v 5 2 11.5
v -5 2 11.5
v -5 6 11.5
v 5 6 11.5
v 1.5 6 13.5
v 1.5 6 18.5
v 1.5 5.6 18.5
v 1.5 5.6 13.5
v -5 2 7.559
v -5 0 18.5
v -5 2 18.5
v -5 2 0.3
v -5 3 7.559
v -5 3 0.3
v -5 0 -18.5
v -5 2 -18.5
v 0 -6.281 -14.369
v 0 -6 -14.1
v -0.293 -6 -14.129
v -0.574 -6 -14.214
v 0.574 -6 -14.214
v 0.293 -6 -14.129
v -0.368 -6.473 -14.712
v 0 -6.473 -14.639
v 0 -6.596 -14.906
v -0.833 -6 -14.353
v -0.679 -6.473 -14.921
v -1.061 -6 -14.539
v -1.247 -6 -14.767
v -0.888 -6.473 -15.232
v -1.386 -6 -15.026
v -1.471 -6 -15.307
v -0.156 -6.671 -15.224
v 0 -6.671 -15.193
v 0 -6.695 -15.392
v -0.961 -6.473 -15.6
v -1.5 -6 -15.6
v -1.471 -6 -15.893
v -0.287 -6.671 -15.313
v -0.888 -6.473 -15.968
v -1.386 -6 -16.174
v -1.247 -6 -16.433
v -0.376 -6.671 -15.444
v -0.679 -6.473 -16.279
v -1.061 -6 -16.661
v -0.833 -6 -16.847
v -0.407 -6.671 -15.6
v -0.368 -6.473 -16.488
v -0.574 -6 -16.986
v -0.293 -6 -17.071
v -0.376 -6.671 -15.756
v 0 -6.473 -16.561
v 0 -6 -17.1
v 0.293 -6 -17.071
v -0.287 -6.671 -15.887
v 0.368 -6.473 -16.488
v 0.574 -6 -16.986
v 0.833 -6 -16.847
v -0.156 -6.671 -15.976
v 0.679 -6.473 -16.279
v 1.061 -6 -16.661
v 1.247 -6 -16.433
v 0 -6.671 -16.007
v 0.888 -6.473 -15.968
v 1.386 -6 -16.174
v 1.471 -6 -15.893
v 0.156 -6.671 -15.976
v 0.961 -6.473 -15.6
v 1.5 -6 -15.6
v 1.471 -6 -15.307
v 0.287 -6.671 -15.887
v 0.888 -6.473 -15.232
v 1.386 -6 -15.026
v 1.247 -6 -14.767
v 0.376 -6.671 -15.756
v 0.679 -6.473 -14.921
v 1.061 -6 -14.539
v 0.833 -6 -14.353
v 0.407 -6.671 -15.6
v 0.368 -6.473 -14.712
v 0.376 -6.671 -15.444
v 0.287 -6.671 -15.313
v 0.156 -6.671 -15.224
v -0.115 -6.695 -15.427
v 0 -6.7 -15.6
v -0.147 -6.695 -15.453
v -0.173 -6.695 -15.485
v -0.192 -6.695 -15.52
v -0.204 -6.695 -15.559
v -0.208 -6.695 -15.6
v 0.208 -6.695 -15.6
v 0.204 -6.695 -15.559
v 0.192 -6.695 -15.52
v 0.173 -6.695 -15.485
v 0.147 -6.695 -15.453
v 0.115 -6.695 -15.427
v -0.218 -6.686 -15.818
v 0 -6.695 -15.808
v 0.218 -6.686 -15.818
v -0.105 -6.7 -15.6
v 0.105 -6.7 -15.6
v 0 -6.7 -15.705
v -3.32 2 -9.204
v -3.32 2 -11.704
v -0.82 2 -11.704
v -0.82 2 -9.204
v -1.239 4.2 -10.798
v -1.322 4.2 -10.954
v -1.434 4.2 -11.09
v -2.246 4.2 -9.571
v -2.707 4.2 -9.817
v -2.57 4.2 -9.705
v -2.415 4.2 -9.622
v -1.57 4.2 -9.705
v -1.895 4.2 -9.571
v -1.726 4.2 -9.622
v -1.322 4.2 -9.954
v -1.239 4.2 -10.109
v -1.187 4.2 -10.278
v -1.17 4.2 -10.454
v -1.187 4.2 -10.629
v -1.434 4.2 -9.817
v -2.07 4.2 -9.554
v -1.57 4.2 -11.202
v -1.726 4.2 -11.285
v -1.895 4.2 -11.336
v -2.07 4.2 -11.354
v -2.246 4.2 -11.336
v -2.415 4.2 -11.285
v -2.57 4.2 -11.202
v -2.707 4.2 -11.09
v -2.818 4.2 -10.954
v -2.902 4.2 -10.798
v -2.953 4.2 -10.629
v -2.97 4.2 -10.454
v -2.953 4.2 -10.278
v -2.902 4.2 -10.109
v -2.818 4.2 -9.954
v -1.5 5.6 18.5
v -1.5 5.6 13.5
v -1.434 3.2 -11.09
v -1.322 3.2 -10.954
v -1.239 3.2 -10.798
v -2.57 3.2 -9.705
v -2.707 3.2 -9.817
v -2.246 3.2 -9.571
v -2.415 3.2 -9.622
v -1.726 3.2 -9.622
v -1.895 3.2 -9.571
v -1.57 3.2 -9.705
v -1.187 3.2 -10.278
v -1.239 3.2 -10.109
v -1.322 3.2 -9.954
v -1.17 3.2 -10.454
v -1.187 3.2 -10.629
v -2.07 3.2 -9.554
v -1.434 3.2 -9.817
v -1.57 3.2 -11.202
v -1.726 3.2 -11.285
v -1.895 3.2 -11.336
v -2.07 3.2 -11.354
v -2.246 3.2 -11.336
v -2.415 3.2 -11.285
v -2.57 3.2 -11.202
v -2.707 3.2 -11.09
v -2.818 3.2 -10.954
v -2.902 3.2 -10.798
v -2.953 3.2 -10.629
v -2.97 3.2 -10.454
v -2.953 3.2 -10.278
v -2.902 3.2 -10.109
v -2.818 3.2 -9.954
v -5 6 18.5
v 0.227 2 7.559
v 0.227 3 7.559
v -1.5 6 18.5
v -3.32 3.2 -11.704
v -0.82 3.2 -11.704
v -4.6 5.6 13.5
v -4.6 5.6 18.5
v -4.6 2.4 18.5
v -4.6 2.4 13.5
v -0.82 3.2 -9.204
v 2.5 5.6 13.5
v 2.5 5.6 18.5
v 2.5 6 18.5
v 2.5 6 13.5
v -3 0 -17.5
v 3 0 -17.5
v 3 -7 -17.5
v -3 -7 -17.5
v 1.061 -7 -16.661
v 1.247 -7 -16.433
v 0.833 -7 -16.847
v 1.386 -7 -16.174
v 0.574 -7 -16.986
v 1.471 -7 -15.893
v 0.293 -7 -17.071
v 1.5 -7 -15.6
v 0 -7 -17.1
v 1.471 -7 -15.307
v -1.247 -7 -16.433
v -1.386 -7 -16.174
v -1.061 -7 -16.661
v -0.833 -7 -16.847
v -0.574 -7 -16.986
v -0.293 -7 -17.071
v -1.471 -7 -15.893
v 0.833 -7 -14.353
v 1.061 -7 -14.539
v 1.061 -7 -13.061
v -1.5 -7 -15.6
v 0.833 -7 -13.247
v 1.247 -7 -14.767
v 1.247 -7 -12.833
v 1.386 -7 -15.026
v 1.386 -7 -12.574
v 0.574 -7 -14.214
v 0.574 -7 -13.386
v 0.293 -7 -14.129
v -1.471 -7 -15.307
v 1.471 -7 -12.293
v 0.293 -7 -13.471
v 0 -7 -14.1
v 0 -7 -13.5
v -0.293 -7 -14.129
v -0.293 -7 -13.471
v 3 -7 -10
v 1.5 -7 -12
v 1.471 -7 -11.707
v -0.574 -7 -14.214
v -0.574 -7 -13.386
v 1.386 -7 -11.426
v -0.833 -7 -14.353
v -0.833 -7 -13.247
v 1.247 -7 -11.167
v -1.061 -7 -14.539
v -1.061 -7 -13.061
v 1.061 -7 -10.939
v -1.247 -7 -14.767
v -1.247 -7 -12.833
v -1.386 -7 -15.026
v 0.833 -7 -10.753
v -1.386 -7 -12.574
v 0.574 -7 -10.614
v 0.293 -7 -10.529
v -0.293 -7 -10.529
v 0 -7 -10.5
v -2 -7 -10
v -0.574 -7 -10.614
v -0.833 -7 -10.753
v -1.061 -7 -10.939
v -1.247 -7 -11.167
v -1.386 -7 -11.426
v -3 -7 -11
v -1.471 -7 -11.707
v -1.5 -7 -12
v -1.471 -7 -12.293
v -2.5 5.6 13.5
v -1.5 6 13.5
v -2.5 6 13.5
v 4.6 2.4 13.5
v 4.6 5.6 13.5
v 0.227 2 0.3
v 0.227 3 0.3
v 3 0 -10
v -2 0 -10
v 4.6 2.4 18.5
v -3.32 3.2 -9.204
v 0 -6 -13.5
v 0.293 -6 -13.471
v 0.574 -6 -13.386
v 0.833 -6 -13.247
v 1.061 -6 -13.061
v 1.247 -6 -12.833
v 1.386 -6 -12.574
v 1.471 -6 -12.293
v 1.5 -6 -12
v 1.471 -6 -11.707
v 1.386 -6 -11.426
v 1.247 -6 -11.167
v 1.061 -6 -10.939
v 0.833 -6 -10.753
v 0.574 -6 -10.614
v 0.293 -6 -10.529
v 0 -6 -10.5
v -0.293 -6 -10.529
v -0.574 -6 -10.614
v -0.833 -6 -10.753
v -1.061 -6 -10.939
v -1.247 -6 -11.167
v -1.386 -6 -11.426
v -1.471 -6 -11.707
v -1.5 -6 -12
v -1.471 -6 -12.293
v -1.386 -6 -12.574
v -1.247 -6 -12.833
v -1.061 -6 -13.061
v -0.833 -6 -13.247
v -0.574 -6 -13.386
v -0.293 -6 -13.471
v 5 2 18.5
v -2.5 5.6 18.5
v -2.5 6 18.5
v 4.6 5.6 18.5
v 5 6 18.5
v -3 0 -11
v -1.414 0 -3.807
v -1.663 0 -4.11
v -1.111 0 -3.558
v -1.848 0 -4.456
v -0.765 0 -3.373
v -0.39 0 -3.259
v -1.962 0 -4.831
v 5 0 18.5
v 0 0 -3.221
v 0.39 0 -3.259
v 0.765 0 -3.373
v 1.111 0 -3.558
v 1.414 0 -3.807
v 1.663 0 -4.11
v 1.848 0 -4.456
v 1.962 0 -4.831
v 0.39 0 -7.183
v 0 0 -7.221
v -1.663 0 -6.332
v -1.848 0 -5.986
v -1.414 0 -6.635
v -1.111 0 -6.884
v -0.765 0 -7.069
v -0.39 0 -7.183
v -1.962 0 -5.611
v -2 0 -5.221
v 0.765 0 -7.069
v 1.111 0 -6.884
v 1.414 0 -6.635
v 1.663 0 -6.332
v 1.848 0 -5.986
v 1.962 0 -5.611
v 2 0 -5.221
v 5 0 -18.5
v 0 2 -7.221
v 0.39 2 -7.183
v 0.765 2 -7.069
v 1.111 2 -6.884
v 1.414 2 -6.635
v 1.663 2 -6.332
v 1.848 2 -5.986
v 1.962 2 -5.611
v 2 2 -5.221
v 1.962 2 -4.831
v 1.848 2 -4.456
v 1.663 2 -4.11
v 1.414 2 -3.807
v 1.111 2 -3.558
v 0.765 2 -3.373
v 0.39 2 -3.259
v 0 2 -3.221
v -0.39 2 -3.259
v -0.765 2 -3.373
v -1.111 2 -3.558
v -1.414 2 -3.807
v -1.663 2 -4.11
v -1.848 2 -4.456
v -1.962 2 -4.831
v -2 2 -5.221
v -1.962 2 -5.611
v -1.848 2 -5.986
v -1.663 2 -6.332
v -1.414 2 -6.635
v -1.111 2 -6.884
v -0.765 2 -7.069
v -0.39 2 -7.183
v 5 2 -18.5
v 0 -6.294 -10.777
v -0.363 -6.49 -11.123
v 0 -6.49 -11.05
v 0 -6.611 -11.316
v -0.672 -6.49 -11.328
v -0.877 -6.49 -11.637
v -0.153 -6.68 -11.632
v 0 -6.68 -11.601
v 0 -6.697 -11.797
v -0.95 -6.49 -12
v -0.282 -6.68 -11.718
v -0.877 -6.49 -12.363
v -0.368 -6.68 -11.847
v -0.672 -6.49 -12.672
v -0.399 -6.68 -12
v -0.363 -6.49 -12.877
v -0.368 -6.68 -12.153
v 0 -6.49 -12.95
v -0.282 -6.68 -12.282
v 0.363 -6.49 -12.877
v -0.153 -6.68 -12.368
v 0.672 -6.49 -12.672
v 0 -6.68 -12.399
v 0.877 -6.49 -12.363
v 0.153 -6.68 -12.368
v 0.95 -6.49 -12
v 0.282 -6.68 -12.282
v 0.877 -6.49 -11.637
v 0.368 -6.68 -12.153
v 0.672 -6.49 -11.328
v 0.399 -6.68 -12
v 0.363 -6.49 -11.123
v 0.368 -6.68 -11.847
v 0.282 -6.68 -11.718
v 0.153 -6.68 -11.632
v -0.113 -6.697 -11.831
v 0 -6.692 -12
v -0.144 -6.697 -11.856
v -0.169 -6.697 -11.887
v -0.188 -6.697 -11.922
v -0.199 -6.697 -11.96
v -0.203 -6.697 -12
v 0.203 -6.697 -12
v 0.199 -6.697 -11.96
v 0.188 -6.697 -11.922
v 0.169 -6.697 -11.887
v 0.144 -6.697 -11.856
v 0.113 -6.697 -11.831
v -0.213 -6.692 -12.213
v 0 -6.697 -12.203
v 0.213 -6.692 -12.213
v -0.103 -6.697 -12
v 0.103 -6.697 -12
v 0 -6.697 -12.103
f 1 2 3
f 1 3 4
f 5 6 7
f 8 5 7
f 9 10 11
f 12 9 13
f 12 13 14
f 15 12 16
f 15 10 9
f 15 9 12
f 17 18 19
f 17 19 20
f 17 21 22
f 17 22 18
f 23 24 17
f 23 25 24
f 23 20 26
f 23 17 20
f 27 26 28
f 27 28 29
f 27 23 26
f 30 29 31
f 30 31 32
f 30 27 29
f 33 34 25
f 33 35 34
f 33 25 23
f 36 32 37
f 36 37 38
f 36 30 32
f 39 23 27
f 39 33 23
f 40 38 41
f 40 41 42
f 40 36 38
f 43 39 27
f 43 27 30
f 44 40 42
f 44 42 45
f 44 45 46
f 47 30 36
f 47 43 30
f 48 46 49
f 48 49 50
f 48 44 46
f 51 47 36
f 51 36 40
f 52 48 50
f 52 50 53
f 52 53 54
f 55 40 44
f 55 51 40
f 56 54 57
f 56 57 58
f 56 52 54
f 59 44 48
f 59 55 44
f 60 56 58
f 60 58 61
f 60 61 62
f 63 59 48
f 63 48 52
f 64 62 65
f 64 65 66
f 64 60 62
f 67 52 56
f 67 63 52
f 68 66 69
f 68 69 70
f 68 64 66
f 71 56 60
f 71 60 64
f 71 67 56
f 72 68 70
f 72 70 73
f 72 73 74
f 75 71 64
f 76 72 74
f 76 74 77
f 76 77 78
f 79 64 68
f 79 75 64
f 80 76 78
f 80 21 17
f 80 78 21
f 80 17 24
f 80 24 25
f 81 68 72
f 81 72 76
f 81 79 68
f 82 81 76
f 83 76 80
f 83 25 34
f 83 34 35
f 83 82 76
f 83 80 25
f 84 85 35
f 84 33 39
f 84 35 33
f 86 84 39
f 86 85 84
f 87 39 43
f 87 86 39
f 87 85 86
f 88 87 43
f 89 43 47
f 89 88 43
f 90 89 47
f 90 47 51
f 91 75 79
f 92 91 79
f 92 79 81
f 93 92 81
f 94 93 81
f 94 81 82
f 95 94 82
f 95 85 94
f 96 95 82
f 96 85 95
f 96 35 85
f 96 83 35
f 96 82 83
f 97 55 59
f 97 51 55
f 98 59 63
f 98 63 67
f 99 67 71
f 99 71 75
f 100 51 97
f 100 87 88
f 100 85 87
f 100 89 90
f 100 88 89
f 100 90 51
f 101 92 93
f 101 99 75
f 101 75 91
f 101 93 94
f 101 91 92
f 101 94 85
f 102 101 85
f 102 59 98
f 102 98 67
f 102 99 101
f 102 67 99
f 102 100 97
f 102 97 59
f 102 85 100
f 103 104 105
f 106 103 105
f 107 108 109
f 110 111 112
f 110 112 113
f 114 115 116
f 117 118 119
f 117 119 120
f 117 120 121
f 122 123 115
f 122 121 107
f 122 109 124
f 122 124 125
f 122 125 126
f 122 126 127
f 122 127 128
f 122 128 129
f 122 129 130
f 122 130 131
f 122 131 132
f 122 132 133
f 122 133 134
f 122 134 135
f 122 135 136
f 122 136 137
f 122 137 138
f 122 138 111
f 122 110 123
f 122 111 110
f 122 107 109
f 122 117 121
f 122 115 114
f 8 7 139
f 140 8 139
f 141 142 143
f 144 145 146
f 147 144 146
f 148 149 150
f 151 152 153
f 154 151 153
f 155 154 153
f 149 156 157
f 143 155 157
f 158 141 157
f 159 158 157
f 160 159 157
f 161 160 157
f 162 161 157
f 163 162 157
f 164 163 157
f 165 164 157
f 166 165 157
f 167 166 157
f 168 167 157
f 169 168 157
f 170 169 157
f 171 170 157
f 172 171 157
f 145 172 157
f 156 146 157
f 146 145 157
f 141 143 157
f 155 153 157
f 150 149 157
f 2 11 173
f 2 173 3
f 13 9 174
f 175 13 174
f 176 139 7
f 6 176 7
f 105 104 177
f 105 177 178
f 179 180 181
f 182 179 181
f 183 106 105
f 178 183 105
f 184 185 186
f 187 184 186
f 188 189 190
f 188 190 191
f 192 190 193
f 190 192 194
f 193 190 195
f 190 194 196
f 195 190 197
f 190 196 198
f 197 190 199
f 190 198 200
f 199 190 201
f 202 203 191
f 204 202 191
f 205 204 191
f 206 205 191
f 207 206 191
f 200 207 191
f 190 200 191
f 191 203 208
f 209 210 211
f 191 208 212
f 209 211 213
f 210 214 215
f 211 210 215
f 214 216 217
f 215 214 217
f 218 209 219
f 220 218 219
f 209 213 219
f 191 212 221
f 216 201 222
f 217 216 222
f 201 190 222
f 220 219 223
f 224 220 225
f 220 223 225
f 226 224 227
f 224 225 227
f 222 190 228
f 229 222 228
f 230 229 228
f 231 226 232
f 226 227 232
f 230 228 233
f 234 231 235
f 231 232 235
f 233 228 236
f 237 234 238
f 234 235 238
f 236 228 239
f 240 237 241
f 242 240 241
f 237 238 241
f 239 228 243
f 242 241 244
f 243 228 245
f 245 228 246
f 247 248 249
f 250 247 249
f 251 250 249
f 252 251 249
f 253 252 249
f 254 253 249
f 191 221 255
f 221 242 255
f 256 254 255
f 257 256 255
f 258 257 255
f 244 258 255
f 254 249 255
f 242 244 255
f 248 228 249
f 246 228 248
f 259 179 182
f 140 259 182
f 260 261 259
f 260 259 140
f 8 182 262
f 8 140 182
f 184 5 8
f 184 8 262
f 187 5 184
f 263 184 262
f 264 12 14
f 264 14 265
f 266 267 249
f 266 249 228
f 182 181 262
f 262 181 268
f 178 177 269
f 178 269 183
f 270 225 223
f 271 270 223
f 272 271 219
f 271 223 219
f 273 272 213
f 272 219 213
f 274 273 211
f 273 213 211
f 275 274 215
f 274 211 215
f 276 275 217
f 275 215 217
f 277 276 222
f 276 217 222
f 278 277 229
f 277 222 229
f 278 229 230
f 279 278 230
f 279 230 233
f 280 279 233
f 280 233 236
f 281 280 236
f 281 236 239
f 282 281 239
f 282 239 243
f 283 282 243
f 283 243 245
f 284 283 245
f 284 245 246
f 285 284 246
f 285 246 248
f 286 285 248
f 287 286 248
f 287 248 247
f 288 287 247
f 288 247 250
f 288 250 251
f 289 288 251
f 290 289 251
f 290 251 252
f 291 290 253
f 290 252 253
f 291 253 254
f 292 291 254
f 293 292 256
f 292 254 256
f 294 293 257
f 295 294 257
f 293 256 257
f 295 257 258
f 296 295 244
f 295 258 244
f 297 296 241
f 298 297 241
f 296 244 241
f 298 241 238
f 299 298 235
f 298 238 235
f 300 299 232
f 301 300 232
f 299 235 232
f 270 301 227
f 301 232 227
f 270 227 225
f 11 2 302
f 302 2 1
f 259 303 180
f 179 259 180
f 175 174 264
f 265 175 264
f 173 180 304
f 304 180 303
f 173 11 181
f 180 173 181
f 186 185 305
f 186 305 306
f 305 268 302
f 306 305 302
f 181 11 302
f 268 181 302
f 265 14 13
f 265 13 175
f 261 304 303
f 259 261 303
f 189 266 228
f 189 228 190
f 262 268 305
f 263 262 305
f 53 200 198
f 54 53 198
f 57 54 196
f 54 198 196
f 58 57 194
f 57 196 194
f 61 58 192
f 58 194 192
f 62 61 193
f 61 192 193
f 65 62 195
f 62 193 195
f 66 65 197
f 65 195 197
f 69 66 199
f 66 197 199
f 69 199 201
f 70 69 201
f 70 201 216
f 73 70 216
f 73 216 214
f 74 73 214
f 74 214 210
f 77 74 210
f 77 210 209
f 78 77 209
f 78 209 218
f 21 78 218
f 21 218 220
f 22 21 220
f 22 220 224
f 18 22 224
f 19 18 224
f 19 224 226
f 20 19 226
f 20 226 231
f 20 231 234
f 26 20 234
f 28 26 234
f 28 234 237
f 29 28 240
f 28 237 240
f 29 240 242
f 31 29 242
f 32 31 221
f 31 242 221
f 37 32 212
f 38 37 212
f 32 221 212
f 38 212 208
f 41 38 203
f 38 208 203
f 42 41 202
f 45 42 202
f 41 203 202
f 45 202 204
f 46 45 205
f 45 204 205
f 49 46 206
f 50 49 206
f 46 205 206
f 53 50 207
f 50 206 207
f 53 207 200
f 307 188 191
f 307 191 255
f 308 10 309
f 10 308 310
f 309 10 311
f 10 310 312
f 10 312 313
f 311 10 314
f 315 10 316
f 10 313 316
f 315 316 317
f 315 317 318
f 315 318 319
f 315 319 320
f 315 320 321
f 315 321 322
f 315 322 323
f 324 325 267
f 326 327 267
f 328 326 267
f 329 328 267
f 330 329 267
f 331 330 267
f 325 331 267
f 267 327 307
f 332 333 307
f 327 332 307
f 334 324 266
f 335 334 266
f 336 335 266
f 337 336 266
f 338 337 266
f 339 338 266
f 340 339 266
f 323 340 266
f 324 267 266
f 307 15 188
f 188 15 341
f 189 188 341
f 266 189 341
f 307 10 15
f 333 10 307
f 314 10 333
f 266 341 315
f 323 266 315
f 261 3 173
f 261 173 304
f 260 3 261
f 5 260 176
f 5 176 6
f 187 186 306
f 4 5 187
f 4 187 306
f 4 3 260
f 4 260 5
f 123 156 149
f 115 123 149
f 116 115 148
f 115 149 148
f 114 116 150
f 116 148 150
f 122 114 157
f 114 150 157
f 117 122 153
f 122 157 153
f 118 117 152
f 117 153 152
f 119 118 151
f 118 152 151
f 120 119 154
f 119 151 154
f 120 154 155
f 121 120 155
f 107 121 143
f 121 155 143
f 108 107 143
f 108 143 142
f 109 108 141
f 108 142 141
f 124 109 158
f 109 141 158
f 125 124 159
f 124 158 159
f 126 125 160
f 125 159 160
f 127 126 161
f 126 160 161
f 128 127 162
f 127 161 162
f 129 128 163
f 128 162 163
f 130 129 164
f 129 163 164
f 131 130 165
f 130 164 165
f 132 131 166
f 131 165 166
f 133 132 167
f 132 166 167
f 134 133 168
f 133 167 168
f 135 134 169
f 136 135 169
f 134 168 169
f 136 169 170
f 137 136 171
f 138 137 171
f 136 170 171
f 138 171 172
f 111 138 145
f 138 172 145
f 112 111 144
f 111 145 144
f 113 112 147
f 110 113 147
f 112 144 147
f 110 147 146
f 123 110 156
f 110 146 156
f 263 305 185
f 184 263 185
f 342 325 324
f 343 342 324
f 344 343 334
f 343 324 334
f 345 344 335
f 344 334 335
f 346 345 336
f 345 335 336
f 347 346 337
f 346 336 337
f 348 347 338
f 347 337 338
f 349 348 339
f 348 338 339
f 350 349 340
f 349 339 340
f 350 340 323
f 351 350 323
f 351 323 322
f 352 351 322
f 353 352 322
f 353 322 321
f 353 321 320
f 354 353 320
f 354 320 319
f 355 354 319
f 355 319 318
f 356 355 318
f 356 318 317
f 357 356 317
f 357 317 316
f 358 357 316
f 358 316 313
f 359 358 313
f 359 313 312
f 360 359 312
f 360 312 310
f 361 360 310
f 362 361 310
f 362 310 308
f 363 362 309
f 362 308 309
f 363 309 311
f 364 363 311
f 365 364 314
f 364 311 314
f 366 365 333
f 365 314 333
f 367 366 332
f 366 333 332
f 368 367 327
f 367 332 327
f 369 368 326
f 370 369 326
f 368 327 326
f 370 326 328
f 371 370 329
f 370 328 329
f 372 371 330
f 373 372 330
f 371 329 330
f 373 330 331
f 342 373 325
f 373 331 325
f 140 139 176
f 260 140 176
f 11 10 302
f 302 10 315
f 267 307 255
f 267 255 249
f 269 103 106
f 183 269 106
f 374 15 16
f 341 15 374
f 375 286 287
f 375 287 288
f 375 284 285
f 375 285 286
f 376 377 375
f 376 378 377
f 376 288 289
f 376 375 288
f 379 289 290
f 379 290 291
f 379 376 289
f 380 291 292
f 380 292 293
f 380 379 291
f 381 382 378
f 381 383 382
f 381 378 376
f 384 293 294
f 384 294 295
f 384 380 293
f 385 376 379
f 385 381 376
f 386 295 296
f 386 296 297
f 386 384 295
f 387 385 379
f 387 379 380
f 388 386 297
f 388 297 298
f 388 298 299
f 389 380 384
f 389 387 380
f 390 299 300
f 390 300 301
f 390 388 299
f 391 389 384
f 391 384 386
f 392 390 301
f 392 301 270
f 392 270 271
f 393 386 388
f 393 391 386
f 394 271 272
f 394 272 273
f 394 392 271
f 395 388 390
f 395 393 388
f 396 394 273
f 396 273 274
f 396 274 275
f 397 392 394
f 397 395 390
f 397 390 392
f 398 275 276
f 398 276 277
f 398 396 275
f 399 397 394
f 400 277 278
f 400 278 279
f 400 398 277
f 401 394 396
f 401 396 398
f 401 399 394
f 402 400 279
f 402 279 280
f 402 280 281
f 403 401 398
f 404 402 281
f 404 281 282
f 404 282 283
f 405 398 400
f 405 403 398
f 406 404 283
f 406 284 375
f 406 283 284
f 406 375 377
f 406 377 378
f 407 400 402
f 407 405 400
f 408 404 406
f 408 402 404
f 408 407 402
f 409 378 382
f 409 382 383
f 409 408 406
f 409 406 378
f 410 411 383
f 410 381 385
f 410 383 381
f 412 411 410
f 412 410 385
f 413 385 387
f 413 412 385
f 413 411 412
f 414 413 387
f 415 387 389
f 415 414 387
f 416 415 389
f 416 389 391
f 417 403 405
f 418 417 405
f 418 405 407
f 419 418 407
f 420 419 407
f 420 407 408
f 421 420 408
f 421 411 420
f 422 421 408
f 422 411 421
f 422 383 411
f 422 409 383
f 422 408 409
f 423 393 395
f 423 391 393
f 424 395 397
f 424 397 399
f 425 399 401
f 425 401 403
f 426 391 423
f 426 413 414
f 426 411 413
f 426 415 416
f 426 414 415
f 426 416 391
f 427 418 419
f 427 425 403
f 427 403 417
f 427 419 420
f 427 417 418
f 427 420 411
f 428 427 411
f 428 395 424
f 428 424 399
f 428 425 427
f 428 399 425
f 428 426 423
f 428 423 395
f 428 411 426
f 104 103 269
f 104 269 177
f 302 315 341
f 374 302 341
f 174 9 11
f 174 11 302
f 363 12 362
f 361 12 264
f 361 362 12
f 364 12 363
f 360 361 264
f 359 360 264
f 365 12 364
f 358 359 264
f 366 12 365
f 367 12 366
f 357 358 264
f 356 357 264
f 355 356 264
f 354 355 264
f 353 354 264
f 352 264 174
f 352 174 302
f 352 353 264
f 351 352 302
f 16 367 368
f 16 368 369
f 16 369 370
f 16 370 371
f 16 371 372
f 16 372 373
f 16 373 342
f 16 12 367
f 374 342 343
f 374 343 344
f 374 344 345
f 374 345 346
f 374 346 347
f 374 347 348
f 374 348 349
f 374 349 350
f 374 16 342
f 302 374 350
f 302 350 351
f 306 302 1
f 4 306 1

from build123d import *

# Parameters (mm, degrees)
SKETCH_1_W          = 10
SKETCH_1_H          = 37
EXTRUDE_1_DEPTH     = 2
SKETCH_2_W          = 10
SKETCH_2_H          = 7
EXTRUDE_2_DEPTH     = 4
CUT_EXTRUDE_1_DEPTH = 5
SKETCH_4_R          = 2
CUT_EXTRUDE_2_DEPTH = 5
EXTRUDE_3_DEPTH     = 7
SKETCH_6_W          = 5.227328637
SKETCH_6_H          = 7.258677384
EXTRUDE_4_DEPTH     = 1
SKETCH_7_W          = 2.5
SKETCH_7_H          = 2.5
EXTRUDE_5_DEPTH     = 1.2
SKETCH_8_R          = 0.9
EXTRUDE_6_DEPTH     = 1
SKETCH_9_R          = 1.5
CUT_EXTRUDE_3_DEPTH = 1


with BuildPart() as part:
    # 草图1 → 凸台-拉伸1 (new body)
    with BuildSketch(Plane(origin=(0, 0, 0), x_dir=(1, 0, 0), z_dir=(0, 1, 0))):
        Rectangle(SKETCH_1_W, SKETCH_1_H)
    extrude(amount=EXTRUDE_1_DEPTH)

    # 草图4 → 切除-拉伸2 (cut)
    with BuildSketch(Plane.XZ):
        with Locations((0, -5.22098653)):
            Circle(SKETCH_4_R)
    extrude(amount=-CUT_EXTRUDE_2_DEPTH, mode=Mode.SUBTRACT)

    # 草图5 → 凸台-拉伸3 (add)
    with BuildSketch(Plane.XZ):
        Polygon((-2, -10), (3, -10), (3, -17.5), (-3, -17.5), (-3, -11), align=None)
    extrude(amount=EXTRUDE_3_DEPTH)

    # 草图6 → 凸台-拉伸4 (add)
    with BuildSketch(Plane(origin=(0, 2, 0), x_dir=(1, 0, 0), z_dir=(0, 1, 0))):
        with Locations((-2.386335681, -3.929338472)):
            Rectangle(SKETCH_6_W, SKETCH_6_H)
    extrude(amount=EXTRUDE_4_DEPTH)

    # 草图9 → 切除-拉伸3 (cut)
    with BuildSketch(Plane.XZ.offset(7)):
        with Locations((0, -12)):
            Circle(SKETCH_9_R)
        with Locations((0, -15.6)):
            Circle(SKETCH_9_R)
    extrude(amount=-CUT_EXTRUDE_3_DEPTH, mode=Mode.SUBTRACT)

    # 草图10 → 旋转1 (revolve)
    with BuildSketch(Plane(origin=(0, 0, 0), x_dir=(0, -1, 0), z_dir=(1, 0, 0))):
        with BuildLine():
            Line((6, 12), (6.691796367, 12))
            add(Edge.make_bspline(
                [(6, 10.5), (6.763042872, 11.099552197), (6.691796367, 12)],
                knots=[0, 0, 0, 1, 1, 1], degree=2))
            Line((6, 10.5), (6, 12))
        make_face()
    revolve(axis=Axis((0, -6, -12), (0, -1, 0)))

    # 草图11 → 旋转2 (revolve)
    with BuildSketch(Plane(origin=(0, 0, 0), x_dir=(0, -1, 0), z_dir=(1, 0, 0))):
        with BuildLine():
            Line((6, 14.1), (6, 15.6))
            Line((6, 15.6), (6.699650248, 15.6))
            add(Edge.make_bspline(
                [(6, 14.1), (6.724602688, 14.677179589), (6.699650248, 15.6)],
                knots=[0, 0, 0, 1, 1, 1], degree=2))
        make_face()
    revolve(axis=Axis((0, -6, -15.6), (0, -1, 0)))


with BuildPart() as body_2:
    # 草图2 → 凸台-拉伸2 (new body)
    with BuildSketch(Plane(origin=(0, 2, 0), x_dir=(1, 0, 0), z_dir=(0, 1, 0))):
        with Locations((0, -15)):
            Rectangle(SKETCH_2_W, SKETCH_2_H)
    extrude(amount=EXTRUDE_2_DEPTH)

    # 草图3 → 切除-拉伸1 (cut)
    with BuildSketch(Plane.XY.offset(18.5)):
        Polygon((1.5, 6), (1.5, 5.6), (-1.5, 5.6), (-1.5, 6), (-2.5, 6), (-2.5, 5.6), (-4.6, 5.6), (-4.6, 2.4), (4.6, 2.4), (4.6, 5.6), (2.5, 5.6), (2.5, 6), align=None)
    extrude(amount=-CUT_EXTRUDE_1_DEPTH, mode=Mode.SUBTRACT)


with BuildPart() as body_3:
    # 草图7 → 凸台-拉伸5 (new body)
    with BuildSketch(Plane(origin=(0, 2, 0), x_dir=(1, 0, 0), z_dir=(0, 1, 0))):
        with Locations((-2.070135445, 10.45360344)):
            Rectangle(SKETCH_7_W, SKETCH_7_H)
    extrude(amount=EXTRUDE_5_DEPTH)


with BuildPart() as body_4:
    # 草图8 → 凸台-拉伸6 (new body)
    with BuildSketch(Plane(origin=(0, 3.2, 0), x_dir=(1, 0, 0), z_dir=(0, 1, 0))):
        with Locations((-2.070135445, 10.45360344)):
            Circle(SKETCH_8_R)
    extrude(amount=EXTRUDE_6_DEPTH)


solid = Compound([part.part, body_2.part, body_3.part, body_4.part])
